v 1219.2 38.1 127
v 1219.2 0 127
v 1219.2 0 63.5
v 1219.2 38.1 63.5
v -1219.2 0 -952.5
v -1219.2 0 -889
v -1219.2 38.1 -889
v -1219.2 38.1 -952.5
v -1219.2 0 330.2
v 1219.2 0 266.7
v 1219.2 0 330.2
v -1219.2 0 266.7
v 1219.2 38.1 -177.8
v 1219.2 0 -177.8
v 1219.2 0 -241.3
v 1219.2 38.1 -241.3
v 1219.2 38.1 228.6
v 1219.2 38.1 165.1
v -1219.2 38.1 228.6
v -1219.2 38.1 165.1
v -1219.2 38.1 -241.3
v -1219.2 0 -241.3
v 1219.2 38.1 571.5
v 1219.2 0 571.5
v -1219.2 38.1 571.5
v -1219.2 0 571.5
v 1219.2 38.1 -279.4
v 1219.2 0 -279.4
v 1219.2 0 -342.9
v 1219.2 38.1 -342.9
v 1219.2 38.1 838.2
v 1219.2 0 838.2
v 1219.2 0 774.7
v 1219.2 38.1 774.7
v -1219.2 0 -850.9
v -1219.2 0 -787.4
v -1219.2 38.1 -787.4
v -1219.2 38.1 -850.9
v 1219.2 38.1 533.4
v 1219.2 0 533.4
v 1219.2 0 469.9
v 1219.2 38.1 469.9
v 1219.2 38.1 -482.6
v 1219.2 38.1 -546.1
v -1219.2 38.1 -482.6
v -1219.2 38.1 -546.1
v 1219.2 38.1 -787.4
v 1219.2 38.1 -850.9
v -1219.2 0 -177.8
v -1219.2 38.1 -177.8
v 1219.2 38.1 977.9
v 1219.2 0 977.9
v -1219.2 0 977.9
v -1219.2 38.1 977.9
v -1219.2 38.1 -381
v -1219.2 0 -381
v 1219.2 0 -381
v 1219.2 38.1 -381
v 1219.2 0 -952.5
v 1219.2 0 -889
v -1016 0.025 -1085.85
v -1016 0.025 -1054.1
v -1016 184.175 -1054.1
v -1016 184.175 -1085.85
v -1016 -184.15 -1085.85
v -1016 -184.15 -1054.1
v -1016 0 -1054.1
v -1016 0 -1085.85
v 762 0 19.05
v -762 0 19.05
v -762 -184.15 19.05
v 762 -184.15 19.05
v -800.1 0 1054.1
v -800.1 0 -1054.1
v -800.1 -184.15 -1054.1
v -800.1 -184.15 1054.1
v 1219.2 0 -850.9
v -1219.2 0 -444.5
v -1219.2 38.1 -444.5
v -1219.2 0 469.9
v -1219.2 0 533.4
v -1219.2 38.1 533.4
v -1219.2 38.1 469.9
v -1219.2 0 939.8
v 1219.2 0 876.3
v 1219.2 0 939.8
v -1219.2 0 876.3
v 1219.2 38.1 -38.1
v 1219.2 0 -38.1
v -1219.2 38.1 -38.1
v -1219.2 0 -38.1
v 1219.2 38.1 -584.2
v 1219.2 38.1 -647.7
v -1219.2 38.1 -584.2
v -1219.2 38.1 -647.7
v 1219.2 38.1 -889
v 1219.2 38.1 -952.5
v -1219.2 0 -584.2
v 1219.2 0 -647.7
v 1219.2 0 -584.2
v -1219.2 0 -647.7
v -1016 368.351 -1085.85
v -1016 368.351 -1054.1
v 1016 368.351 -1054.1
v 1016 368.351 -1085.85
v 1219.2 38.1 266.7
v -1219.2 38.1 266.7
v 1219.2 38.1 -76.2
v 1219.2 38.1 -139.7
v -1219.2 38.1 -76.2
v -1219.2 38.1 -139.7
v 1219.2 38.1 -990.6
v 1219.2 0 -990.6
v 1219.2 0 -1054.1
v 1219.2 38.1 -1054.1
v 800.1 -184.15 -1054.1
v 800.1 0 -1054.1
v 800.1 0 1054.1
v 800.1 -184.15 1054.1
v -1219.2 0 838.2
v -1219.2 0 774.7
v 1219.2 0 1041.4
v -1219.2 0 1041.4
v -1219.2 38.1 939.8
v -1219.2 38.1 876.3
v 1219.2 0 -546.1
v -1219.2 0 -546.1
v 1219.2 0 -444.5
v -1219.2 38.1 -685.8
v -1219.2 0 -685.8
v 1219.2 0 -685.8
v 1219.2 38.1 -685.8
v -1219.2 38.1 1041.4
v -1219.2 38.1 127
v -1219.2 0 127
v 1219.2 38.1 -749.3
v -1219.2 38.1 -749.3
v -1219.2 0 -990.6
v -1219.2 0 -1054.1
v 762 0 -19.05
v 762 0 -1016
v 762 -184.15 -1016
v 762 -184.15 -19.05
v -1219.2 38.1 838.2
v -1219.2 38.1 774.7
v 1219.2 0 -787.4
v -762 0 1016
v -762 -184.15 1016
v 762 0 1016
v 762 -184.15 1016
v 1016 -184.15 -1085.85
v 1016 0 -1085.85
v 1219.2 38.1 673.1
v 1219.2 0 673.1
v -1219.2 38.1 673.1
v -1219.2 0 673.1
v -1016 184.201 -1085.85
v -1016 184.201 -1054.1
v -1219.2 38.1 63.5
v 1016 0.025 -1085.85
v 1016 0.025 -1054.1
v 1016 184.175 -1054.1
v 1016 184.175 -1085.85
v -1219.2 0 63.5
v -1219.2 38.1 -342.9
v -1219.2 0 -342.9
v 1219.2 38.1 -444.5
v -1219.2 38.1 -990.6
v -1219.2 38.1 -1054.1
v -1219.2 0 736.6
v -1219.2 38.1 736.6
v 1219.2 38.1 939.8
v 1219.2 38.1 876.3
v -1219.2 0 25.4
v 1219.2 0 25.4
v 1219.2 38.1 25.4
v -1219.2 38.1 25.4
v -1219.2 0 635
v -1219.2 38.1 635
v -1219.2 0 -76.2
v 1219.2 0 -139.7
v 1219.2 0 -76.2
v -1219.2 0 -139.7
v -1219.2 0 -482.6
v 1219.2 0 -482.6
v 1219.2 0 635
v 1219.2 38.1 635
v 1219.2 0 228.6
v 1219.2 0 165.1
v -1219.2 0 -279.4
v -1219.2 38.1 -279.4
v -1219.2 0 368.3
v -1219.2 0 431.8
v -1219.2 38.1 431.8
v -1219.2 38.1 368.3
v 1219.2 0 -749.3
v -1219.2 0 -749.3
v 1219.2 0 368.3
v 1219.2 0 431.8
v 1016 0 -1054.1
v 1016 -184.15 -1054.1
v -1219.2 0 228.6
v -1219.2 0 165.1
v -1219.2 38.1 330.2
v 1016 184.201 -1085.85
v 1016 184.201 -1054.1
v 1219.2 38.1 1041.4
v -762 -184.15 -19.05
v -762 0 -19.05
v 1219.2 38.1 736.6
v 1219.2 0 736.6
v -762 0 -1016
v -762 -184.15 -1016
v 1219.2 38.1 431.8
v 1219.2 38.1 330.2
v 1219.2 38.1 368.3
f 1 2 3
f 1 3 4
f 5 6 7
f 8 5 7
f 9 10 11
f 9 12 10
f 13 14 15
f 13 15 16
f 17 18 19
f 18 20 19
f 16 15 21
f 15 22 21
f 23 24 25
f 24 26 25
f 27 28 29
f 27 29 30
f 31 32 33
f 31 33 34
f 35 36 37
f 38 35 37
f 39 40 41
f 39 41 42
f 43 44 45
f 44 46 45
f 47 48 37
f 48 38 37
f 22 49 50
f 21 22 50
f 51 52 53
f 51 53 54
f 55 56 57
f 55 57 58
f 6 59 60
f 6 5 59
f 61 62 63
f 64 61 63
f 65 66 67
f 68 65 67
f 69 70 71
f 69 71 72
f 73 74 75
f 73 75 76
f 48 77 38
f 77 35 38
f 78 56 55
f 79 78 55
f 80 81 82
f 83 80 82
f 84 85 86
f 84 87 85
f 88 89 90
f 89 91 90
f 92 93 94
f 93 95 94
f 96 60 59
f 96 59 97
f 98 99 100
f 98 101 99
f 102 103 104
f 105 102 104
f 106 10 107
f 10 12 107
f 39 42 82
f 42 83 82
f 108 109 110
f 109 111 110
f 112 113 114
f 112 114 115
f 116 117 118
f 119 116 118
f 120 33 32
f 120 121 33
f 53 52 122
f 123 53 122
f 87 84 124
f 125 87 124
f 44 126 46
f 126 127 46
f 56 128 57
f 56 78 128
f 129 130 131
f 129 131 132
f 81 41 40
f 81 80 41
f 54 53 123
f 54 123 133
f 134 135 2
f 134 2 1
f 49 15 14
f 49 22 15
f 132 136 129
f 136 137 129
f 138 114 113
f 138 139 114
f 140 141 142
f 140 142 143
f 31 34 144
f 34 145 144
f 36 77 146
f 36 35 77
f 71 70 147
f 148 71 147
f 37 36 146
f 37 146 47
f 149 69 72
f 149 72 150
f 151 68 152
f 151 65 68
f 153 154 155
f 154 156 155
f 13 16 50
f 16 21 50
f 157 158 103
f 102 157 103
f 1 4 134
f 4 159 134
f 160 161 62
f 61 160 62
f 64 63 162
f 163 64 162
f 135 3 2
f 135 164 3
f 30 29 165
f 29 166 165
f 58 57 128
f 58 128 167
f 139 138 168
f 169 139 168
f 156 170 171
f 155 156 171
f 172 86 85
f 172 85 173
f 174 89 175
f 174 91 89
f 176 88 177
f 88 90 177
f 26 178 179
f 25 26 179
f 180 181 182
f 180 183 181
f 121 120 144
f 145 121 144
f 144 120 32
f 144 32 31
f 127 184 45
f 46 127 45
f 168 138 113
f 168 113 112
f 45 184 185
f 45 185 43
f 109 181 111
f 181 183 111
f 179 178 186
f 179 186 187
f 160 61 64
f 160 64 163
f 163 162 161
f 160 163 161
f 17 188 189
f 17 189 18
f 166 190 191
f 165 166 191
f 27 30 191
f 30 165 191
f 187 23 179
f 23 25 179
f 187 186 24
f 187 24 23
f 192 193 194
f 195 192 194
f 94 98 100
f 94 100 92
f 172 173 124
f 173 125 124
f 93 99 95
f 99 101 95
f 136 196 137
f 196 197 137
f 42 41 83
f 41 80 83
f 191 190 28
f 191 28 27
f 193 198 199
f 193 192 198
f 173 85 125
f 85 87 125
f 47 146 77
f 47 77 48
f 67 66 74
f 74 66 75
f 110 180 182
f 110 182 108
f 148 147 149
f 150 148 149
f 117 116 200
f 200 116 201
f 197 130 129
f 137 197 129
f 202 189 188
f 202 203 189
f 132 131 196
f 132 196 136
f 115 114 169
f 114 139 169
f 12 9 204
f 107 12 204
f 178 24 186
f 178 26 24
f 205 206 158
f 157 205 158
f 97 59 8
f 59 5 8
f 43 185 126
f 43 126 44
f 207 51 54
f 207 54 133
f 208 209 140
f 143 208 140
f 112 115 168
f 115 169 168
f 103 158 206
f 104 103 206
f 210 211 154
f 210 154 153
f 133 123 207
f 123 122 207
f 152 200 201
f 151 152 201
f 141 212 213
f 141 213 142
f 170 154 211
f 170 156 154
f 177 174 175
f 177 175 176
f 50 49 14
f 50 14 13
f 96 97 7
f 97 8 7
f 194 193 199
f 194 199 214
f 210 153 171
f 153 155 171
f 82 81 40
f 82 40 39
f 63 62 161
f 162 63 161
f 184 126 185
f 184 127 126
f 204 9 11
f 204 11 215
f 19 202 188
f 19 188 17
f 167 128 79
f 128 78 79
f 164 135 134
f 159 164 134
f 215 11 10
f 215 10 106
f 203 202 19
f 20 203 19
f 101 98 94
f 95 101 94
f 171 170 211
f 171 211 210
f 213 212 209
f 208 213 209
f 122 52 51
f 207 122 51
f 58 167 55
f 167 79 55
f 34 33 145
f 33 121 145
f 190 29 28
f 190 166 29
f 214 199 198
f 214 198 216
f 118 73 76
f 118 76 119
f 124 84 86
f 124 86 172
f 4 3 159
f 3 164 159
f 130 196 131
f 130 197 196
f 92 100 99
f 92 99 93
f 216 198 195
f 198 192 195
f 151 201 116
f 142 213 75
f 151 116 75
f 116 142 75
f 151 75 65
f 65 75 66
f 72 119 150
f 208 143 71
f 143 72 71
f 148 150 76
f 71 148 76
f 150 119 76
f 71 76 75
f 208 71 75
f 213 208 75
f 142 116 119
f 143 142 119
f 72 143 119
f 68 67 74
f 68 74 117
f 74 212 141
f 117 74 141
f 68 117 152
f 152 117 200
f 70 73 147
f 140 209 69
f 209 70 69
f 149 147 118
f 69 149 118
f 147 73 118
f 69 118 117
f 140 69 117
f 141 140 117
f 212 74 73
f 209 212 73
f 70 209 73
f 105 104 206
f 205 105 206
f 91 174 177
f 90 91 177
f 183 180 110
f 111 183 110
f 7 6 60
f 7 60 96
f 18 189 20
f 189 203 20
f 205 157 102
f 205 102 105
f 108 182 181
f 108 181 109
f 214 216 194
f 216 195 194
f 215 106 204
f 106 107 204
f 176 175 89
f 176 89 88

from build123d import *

# Parameters (mm, degrees)
F0_W     = 1600.2
F0_H     = 2108.2
F0_W_2   = 1524
F0_H_2   = 2032
F1_DEPTH = 184.15
F3_W     = 1524
F3_H     = 184.15
F4_DEPTH = 19.05
F6_DEPTH = 31.75
F7_W     = 38.1
F7_H     = 63.5
F8_DEPTH = 1219.2


with BuildPart() as f1:
    # F0 (on Front) → F1 (new body)
    with BuildSketch(Plane.XZ):
        Rectangle(F0_W, F0_H)
        Rectangle(F0_W_2, F0_H_2, mode=Mode.SUBTRACT)
    extrude(amount=F1_DEPTH)

    # F3 (on Top) → F4 (join, symmetric)
    with BuildSketch(Plane.XY):
        with Locations((0, -92.075)):
            Rectangle(F3_W, F3_H)
    extrude(amount=F4_DEPTH, both=True)

    # F5 (on face) → F6 (join)
    with BuildSketch(Plane(origin=(0, 0, -1054.1), x_dir=(1, 0, 0), z_dir=(0, 0, -1))):
        Polygon((-1016, 0), (0, 0), (1016, 0), (1016, 184.15), (-1016, 184.15), align=None)
        Polygon((1016, -0.0254), (-1016, -0.0254), (-1016, -184.1754), (0, -184.1754), (1016, -184.1754), align=None)
        Polygon((1016, -184.2008), (-1016, -184.2008), (-1016, -368.3508), (0, -368.3508), (1016, -368.3508), align=None)
    extrude(amount=F6_DEPTH)


with BuildPart() as f8:
    # F7 (on Right) → F8 (new body, symmetric)
    with BuildSketch(Plane.YZ):
        with Locations((19.05, -1022.35)):
            Rectangle(F7_W, F7_H)
        with Locations((19.05, -920.75)):
            Rectangle(F7_W, F7_H)
        with Locations((19.05, -819.15)):
            Rectangle(F7_W, F7_H)
        with Locations((19.05, -717.55)):
            Rectangle(F7_W, F7_H)
        with Locations((19.05, -615.95)):
            Rectangle(F7_W, F7_H)
        with Locations((19.05, -514.35)):
            Rectangle(F7_W, F7_H)
        with Locations((19.05, -412.75)):
            Rectangle(F7_W, F7_H)
        with Locations((19.05, -311.15)):
            Rectangle(F7_W, F7_H)
        with Locations((19.05, -209.55)):
            Rectangle(F7_W, F7_H)
        with Locations((19.05, -107.95)):
            Rectangle(F7_W, F7_H)
        with Locations((19.05, -6.35)):
            Rectangle(F7_W, F7_H)
        with Locations((19.05, 95.25)):
            Rectangle(F7_W, F7_H)
        with Locations((19.05, 196.85)):
            Rectangle(F7_W, F7_H)
        with Locations((19.05, 298.45)):
            Rectangle(F7_W, F7_H)
        with Locations((19.05, 400.05)):
            Rectangle(F7_W, F7_H)
        with Locations((19.05, 501.65)):
            Rectangle(F7_W, F7_H)
        with Locations((19.05, 603.25)):
            Rectangle(F7_W, F7_H)
        with Locations((19.05, 704.85)):
            Rectangle(F7_W, F7_H)
        with Locations((19.05, 806.45)):
            Rectangle(F7_W, F7_H)
        with Locations((19.05, 908.05)):
            Rectangle(F7_W, F7_H)
        with Locations((19.05, 1009.65)):
            Rectangle(F7_W, F7_H)
    extrude(amount=F8_DEPTH, both=True)


solid = Compound([f1.part, f8.part])
